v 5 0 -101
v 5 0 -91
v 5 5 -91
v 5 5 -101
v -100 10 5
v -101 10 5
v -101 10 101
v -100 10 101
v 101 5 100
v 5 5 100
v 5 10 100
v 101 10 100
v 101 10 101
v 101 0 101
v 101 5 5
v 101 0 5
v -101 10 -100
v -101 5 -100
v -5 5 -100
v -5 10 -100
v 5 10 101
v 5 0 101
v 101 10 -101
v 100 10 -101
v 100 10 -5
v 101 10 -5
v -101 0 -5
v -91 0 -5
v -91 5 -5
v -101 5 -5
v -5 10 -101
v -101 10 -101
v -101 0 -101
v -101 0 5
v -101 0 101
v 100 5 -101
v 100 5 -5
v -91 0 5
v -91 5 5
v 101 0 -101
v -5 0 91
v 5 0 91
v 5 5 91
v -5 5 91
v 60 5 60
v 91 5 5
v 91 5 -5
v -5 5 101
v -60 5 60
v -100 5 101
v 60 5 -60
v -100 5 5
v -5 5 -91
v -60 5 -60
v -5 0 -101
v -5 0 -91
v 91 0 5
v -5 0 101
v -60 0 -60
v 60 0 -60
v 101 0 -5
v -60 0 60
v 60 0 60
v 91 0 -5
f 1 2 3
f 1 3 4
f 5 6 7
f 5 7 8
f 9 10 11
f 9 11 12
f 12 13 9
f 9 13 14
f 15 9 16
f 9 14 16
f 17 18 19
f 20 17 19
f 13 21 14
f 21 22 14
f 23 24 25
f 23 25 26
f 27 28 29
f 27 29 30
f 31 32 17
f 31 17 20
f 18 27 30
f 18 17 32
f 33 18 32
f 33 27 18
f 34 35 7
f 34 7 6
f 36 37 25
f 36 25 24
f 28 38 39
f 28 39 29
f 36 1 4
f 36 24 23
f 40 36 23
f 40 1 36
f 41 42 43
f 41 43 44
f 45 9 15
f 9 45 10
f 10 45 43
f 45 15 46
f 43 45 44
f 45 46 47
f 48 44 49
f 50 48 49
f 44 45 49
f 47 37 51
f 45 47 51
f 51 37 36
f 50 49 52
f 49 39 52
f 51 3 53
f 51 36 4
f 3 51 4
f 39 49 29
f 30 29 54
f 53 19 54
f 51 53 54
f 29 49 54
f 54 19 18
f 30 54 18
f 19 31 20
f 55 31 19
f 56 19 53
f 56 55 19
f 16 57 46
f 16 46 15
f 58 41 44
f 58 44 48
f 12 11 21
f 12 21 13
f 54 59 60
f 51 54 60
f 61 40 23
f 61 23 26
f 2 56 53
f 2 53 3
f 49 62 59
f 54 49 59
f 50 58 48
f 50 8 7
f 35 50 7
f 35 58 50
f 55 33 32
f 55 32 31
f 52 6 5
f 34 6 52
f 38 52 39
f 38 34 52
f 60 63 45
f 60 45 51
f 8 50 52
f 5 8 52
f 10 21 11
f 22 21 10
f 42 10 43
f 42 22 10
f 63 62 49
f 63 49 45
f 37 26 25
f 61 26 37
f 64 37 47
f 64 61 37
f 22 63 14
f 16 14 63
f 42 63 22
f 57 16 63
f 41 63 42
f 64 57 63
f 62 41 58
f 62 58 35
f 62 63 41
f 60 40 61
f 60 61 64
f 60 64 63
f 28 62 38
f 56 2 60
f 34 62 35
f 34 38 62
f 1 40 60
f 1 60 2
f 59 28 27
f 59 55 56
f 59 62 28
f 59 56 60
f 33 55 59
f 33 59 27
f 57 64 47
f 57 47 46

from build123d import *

# Parameters (mm, degrees)
SKETCH1_W           = 120
SKETCH1_H           = 120
BOSS_EXTRUDE1_DEPTH = 5
SKETCH2_W           = 96
SKETCH2_H           = 1
SKETCH2_W_2         = 1
SKETCH2_H_2         = 96
BOSS_EXTRUDE2_DEPTH = 5


with BuildPart() as part:
    # Sketch1 → Boss-Extrude1 (new body)
    with BuildSketch(Plane(origin=(0, 0, 0), x_dir=(1, 0, 0), z_dir=(0, 1, 0))):
        Polygon((101, -101), (5, -101), (5, -91), (-5, -91), (-5, -101), (-101, -101), (-101, -5), (-91, -5), (-91, 5), (-101, 5), (-101, 101), (-5, 101), (-5, 91), (5, 91), (5, 101), (101, 101), (101, 5), (91, 5), (91, -5), (101, -5), align=None)
        Rectangle(SKETCH1_W, SKETCH1_H, mode=Mode.SUBTRACT)
    extrude(amount=BOSS_EXTRUDE1_DEPTH)

    # Sketch2 → Boss-Extrude2 (add)
    with BuildSketch(Plane(origin=(0, 5, 0), x_dir=(1, 0, 0), z_dir=(0, 1, 0))):
        with Locations((53, -100.5)):
            Rectangle(SKETCH2_W, SKETCH2_H)
        with Locations((-100.5, -53)):
            Rectangle(SKETCH2_W_2, SKETCH2_H_2)
        with Locations((-53, 100.5)):
            Rectangle(SKETCH2_W, SKETCH2_H)
        with Locations((100.5, 53)):
            Rectangle(SKETCH2_W_2, SKETCH2_H_2)
    extrude(amount=BOSS_EXTRUDE2_DEPTH)


solid = part.part
